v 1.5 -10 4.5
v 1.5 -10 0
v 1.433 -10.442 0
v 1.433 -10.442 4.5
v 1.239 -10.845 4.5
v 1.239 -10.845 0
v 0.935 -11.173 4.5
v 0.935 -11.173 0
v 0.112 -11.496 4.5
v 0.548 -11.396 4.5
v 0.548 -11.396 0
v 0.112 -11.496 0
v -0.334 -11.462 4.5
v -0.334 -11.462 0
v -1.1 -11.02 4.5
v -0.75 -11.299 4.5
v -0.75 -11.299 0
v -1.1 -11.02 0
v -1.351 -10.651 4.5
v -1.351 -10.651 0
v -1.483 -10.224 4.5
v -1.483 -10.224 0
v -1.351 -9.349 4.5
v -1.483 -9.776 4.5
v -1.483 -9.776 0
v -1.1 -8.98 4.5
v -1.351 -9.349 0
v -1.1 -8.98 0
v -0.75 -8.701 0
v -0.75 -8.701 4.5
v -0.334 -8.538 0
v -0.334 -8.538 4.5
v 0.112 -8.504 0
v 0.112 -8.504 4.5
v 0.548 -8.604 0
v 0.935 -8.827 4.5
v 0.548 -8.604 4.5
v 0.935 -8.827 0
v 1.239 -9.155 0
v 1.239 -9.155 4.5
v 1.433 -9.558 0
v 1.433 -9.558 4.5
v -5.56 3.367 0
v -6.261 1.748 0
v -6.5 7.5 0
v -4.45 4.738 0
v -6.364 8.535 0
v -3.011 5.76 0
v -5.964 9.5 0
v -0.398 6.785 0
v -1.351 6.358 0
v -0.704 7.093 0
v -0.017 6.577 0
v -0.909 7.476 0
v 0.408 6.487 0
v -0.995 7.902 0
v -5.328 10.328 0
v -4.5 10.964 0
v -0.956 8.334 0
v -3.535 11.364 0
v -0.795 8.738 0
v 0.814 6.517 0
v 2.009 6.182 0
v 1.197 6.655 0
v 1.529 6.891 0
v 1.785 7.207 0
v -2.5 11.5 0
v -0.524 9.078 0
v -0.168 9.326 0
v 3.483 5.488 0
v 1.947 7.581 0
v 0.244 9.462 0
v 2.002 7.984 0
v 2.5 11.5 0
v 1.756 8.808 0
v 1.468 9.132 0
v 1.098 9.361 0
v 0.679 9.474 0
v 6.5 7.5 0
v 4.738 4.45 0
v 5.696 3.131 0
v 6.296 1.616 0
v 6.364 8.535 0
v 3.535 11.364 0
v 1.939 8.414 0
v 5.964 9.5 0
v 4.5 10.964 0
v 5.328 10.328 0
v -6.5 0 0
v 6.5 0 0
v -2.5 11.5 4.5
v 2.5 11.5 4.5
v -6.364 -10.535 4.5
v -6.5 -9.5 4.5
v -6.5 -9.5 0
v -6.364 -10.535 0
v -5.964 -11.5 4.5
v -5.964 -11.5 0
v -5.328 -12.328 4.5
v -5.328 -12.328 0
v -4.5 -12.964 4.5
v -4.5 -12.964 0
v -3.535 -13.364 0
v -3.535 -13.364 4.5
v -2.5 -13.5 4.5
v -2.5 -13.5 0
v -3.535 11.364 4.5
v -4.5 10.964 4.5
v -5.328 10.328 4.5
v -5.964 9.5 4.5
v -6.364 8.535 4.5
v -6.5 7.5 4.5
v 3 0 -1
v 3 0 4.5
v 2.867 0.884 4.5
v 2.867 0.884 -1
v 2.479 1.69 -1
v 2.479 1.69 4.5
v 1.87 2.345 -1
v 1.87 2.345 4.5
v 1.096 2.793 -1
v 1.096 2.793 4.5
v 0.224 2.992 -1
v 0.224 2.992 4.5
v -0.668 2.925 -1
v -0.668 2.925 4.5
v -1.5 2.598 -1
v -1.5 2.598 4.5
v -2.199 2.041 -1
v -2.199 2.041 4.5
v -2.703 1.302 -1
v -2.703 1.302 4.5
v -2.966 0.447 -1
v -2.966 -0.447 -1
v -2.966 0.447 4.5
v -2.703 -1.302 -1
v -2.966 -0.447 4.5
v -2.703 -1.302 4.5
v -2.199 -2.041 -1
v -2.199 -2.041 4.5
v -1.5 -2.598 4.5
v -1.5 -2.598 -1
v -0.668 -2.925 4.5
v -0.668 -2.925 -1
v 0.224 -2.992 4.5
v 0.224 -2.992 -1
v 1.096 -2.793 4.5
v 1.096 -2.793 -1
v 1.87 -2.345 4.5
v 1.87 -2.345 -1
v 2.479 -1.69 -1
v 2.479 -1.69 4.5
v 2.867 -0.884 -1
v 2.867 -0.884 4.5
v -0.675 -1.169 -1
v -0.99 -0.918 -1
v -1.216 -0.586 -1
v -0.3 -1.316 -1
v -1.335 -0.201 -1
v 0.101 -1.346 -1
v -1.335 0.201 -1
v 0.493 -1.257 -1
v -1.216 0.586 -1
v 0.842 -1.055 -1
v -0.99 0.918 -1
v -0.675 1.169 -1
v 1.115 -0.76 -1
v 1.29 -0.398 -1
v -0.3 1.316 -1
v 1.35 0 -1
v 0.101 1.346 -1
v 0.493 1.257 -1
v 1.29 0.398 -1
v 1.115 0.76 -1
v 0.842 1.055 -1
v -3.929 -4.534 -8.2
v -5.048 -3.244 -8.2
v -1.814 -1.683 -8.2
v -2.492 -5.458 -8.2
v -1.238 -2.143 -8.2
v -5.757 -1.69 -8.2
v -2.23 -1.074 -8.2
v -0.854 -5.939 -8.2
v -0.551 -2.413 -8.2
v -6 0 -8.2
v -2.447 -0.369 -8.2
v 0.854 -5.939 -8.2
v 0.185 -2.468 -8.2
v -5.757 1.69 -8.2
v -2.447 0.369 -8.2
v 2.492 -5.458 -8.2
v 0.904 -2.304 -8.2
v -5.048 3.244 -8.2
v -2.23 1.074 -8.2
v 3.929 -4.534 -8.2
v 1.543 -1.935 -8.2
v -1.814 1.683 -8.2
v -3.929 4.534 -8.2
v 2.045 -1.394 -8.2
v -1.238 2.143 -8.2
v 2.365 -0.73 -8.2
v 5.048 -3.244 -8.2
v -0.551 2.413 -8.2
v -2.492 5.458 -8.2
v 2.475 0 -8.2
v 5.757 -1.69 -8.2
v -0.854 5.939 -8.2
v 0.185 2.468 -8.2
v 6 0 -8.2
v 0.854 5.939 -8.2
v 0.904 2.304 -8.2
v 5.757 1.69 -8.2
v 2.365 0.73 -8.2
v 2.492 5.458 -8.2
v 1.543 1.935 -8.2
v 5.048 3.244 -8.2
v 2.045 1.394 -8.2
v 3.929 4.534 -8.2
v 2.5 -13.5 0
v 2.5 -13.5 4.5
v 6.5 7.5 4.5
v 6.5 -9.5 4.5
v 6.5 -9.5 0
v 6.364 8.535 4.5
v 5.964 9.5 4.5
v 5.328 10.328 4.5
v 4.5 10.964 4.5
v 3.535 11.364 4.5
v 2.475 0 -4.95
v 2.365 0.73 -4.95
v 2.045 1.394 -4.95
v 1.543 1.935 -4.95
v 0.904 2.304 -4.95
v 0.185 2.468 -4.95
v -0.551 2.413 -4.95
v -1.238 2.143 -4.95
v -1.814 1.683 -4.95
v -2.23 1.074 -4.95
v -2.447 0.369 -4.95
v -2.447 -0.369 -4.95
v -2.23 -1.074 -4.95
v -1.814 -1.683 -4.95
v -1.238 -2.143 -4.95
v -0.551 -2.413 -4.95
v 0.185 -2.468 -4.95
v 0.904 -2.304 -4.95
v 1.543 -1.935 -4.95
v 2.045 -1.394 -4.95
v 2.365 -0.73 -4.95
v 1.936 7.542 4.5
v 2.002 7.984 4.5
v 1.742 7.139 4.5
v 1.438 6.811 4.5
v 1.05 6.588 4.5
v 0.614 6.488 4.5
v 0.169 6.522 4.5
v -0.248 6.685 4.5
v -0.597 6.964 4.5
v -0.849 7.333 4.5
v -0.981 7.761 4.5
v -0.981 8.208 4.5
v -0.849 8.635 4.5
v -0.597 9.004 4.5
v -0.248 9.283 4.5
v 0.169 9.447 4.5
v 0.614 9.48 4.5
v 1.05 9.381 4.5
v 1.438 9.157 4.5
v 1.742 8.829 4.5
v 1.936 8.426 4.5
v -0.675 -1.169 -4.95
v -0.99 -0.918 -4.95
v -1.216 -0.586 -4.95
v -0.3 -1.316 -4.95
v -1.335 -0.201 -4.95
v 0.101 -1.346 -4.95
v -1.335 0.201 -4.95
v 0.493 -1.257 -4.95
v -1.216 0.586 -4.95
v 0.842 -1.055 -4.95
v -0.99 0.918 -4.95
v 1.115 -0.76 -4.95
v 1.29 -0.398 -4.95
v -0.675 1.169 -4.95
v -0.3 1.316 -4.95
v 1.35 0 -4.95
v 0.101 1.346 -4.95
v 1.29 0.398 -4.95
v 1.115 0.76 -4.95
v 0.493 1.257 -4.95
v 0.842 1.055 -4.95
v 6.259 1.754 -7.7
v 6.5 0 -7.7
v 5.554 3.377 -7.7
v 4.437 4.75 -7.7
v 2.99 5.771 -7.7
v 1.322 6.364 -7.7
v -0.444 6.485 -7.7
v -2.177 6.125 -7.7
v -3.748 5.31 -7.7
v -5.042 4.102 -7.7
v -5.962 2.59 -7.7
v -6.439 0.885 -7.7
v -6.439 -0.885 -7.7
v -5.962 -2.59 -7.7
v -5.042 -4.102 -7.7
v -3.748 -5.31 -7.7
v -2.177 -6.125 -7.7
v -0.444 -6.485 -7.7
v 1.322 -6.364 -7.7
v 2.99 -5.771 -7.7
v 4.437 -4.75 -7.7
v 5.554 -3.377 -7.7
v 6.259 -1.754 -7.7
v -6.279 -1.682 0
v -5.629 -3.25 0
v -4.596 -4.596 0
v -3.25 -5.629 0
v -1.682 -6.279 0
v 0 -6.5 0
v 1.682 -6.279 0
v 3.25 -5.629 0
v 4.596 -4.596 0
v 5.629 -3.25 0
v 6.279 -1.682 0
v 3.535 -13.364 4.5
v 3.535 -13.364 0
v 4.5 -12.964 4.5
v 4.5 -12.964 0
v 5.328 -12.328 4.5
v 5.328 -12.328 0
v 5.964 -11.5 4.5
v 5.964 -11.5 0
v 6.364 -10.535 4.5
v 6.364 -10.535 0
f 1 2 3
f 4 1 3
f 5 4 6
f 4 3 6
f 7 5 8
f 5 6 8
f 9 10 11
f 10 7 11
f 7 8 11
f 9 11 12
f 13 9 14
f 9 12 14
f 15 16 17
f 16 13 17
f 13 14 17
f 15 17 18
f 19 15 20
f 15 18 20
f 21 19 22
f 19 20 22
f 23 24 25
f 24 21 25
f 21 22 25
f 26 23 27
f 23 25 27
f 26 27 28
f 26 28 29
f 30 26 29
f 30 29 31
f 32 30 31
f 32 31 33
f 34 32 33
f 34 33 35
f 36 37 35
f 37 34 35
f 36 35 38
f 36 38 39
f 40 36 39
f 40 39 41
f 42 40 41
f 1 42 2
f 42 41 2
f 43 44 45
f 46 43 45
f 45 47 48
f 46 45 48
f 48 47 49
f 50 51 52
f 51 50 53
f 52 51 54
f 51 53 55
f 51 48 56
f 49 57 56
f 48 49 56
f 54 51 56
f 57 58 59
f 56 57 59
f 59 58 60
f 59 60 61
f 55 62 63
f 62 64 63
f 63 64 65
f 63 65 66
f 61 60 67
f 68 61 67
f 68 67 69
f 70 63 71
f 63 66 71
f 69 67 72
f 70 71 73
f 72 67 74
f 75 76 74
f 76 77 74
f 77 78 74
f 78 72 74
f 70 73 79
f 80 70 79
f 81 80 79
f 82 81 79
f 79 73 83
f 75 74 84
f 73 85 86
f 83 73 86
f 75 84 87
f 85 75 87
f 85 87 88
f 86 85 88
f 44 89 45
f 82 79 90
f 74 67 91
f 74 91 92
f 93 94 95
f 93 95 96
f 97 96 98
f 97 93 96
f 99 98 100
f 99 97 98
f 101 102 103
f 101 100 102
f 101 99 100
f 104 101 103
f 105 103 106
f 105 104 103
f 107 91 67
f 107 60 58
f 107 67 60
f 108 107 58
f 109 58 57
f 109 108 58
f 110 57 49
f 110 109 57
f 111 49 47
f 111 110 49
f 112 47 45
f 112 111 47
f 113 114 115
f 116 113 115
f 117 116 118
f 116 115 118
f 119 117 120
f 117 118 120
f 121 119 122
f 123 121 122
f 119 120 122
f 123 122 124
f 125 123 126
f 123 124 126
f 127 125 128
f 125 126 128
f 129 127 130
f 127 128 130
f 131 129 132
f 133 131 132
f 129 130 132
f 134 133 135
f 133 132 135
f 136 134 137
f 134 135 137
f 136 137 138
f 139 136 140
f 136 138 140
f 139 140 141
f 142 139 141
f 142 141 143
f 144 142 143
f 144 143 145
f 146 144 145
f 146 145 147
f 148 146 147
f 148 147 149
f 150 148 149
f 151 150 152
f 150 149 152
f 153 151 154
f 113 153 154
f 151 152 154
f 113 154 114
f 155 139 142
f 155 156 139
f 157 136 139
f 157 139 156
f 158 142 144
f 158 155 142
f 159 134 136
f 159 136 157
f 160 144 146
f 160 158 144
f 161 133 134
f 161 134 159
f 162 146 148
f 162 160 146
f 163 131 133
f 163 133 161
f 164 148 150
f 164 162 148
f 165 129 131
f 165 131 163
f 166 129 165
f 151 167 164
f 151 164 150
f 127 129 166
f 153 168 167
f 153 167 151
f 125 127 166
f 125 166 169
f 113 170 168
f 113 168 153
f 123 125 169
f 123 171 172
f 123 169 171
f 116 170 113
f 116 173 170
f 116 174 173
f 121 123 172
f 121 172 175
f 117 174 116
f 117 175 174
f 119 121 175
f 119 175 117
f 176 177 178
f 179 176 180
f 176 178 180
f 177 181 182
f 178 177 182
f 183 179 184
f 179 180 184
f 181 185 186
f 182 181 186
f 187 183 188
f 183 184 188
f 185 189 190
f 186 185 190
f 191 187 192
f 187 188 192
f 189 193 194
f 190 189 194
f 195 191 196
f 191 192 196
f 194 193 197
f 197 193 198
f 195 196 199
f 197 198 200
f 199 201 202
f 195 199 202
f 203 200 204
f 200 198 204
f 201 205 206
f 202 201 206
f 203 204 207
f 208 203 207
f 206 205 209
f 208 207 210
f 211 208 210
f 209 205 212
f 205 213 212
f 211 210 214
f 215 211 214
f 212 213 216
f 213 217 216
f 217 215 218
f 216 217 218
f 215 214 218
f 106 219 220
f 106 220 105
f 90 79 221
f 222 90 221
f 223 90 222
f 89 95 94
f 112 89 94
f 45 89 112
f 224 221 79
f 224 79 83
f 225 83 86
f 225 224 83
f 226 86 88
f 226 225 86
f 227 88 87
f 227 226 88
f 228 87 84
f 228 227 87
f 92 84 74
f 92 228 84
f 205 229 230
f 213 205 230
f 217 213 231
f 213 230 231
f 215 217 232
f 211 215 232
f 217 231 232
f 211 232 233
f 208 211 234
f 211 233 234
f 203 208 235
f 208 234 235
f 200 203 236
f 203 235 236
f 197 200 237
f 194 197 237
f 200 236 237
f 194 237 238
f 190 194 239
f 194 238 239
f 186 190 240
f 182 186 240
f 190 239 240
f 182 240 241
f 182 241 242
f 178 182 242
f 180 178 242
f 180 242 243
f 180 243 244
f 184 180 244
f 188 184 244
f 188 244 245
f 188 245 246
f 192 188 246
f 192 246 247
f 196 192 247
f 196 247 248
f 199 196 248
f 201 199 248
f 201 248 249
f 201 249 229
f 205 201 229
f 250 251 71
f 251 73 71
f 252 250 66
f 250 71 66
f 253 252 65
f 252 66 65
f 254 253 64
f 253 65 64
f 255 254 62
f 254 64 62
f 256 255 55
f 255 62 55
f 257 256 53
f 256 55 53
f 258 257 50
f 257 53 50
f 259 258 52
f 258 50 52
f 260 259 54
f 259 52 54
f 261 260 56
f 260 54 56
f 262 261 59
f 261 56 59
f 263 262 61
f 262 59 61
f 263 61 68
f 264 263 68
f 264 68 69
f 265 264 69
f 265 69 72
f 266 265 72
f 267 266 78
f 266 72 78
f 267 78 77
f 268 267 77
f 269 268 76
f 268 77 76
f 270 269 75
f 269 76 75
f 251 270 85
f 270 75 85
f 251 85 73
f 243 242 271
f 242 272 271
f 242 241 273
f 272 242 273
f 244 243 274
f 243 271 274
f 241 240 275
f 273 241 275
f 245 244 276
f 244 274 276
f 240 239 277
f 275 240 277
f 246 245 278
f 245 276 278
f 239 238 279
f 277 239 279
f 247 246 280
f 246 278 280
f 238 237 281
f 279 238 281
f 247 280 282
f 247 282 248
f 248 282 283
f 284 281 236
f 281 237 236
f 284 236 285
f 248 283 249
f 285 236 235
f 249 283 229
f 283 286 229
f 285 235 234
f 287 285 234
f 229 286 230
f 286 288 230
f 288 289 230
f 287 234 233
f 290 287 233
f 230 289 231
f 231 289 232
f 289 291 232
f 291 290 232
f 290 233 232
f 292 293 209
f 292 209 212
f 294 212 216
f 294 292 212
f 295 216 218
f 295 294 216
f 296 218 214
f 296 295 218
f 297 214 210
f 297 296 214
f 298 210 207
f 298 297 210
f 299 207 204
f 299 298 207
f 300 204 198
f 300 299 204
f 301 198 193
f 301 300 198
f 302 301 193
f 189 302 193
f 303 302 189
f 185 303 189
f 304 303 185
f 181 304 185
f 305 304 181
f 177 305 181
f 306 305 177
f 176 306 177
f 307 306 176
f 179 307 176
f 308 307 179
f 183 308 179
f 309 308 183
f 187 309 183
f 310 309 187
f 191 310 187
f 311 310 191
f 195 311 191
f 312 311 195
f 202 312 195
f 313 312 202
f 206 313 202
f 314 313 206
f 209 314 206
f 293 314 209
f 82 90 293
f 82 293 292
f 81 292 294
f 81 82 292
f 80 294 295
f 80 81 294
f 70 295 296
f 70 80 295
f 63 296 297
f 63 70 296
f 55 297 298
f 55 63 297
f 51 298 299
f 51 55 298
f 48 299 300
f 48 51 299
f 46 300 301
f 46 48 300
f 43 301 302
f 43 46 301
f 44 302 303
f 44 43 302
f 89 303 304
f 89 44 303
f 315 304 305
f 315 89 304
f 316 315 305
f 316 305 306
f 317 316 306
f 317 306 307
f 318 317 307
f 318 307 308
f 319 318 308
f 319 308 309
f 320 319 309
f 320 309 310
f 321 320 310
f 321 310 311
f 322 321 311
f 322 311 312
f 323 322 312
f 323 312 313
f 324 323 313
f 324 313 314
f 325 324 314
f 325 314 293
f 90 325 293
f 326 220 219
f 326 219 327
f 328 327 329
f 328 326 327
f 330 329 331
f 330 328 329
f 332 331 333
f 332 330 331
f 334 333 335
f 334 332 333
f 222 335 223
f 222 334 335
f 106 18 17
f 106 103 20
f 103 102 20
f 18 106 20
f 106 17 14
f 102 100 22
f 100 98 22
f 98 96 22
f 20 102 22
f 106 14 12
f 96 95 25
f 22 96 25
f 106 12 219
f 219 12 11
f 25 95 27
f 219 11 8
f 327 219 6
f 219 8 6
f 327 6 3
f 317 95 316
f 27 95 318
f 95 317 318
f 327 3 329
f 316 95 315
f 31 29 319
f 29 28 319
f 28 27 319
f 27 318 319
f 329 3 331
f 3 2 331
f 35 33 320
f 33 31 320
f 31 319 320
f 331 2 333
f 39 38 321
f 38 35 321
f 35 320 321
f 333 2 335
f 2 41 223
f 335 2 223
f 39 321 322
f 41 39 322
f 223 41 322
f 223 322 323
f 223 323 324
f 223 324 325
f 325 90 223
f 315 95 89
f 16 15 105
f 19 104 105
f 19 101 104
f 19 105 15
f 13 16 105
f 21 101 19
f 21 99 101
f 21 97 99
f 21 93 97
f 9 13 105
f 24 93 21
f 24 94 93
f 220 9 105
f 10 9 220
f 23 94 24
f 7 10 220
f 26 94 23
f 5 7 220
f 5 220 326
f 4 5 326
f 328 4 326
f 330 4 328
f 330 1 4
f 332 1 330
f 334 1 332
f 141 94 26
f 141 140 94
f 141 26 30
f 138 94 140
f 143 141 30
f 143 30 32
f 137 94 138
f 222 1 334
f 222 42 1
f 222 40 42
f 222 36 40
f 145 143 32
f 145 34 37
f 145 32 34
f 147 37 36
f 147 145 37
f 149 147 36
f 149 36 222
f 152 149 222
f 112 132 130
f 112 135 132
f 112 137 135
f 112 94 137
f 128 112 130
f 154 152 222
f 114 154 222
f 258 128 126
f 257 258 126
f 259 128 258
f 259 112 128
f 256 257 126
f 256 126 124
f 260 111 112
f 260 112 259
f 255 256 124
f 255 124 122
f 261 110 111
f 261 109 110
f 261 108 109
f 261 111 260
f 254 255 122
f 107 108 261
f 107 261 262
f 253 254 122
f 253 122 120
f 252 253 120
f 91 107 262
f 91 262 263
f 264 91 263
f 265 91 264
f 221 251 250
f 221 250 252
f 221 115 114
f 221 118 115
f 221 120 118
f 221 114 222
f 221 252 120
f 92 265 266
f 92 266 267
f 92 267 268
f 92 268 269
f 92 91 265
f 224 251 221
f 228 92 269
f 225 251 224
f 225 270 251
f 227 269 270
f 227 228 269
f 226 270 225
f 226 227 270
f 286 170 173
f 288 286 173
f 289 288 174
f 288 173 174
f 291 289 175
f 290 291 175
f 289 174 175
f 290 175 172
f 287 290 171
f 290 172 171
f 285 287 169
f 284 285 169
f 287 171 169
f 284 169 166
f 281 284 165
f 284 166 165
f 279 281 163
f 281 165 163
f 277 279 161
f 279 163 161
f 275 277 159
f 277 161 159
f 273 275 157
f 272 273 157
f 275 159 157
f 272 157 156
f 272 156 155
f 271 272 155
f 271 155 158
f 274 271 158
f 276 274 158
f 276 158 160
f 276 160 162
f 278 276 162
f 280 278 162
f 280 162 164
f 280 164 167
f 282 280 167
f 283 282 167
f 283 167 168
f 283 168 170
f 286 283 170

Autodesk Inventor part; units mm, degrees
ref_plane "YZ Plane" through (0, 0, 0) normal (1, 0, 0) x (0, 1, 0)
ref_plane "XZ Plane" through (0, 0, 0) normal (0, 1, 0) x (-1, 0, 0)
ref_plane "XY Plane" through (0, 0, 0) normal (0, 0, 1) x (1, 0, 0)
sketch "Skizze1" plane through (0, 0, 0) normal (0, 0, 1) x (1, 0, 0)
  line L0 (-6.5, 13.5) -> (6.5, 13.5)
  line L1 (6.5, 13.5) -> (6.5, -13.5)
  line L2 (6.5, -13.5) -> (-6.5, -13.5)
  line L3 (-6.5, -13.5) -> (-6.5, 13.5)
  line L4 (-6.5, 13.5) -> (6.5, -13.5) construction
  line L5 (6.5, 13.5) -> (-6.5, -13.5) construction
  line L6 (0, 0) -> (0.502324, 7.984214) construction
  line L7 (0, 0) -> (0, -13.5) construction
  circle A0 centre (0, -10) radius 1.5
  circle A1 centre (0.502324, 7.984214) radius 1.5
  line L8 (-6.5, 11.5) -> (6.5, 11.5)
  circle A2 centre (0, 0) radius 6.5
  circle A3 centre (0, 0) radius 2.475
  circle A4 centre (0, 0) radius 1.35
  circle A5 centre (0, 0) radius 3
  dimension "d13" = 3
  dimension "d14" = 3
  dimension "d15" = 3.5
  dimension "d16" = 10
  dimension "d17" = 8
  dimension "d18" = 3.6
  dimension "d23" = 4.95
  dimension "d26" = 2.7
  dimension "d29" = 6
  dimension "d37" = 13
  dimension "d39" = 25
extrude "Extrusion1" add sketch "Skizze1" along normal blind 4.5 contours L8 L1 A2 L3 | A2 L1 L2 L3 | A2 | A3 | A4 | A5
extrude "Extrusion2" add sketch "Skizze1" against normal blind 8.2 contours A2 | A5
extrude "Extrusion3" cut sketch "Skizze1" along normal through all contours A4
extrude "Extrusion4" cut sketch "Skizze1" against normal blind 7 from surface at 4.5 contours A3 | A4 | A5
chamfer "Fase1" distance 0.5 angle 45 1 edges at (-6.5, 0, -8.2)
fillet "Rundung1" radius 4 4 edges at (6.5, 11.5, 2.25) (-6.5, 11.5, 2.25) (6.5, -13.5, 2.25) (-6.5, -13.5, 2.25)
extrude "Extrusion6" add sketch "Skizze1" against normal blind 4.95 contours A3 | A5
extrude "Extrusion7" cut sketch "Skizze1" against normal blind 1 contours A3 | A5
equation "\"d14\" = d13"
properties part number "daVinci_Tool_Clutch"
